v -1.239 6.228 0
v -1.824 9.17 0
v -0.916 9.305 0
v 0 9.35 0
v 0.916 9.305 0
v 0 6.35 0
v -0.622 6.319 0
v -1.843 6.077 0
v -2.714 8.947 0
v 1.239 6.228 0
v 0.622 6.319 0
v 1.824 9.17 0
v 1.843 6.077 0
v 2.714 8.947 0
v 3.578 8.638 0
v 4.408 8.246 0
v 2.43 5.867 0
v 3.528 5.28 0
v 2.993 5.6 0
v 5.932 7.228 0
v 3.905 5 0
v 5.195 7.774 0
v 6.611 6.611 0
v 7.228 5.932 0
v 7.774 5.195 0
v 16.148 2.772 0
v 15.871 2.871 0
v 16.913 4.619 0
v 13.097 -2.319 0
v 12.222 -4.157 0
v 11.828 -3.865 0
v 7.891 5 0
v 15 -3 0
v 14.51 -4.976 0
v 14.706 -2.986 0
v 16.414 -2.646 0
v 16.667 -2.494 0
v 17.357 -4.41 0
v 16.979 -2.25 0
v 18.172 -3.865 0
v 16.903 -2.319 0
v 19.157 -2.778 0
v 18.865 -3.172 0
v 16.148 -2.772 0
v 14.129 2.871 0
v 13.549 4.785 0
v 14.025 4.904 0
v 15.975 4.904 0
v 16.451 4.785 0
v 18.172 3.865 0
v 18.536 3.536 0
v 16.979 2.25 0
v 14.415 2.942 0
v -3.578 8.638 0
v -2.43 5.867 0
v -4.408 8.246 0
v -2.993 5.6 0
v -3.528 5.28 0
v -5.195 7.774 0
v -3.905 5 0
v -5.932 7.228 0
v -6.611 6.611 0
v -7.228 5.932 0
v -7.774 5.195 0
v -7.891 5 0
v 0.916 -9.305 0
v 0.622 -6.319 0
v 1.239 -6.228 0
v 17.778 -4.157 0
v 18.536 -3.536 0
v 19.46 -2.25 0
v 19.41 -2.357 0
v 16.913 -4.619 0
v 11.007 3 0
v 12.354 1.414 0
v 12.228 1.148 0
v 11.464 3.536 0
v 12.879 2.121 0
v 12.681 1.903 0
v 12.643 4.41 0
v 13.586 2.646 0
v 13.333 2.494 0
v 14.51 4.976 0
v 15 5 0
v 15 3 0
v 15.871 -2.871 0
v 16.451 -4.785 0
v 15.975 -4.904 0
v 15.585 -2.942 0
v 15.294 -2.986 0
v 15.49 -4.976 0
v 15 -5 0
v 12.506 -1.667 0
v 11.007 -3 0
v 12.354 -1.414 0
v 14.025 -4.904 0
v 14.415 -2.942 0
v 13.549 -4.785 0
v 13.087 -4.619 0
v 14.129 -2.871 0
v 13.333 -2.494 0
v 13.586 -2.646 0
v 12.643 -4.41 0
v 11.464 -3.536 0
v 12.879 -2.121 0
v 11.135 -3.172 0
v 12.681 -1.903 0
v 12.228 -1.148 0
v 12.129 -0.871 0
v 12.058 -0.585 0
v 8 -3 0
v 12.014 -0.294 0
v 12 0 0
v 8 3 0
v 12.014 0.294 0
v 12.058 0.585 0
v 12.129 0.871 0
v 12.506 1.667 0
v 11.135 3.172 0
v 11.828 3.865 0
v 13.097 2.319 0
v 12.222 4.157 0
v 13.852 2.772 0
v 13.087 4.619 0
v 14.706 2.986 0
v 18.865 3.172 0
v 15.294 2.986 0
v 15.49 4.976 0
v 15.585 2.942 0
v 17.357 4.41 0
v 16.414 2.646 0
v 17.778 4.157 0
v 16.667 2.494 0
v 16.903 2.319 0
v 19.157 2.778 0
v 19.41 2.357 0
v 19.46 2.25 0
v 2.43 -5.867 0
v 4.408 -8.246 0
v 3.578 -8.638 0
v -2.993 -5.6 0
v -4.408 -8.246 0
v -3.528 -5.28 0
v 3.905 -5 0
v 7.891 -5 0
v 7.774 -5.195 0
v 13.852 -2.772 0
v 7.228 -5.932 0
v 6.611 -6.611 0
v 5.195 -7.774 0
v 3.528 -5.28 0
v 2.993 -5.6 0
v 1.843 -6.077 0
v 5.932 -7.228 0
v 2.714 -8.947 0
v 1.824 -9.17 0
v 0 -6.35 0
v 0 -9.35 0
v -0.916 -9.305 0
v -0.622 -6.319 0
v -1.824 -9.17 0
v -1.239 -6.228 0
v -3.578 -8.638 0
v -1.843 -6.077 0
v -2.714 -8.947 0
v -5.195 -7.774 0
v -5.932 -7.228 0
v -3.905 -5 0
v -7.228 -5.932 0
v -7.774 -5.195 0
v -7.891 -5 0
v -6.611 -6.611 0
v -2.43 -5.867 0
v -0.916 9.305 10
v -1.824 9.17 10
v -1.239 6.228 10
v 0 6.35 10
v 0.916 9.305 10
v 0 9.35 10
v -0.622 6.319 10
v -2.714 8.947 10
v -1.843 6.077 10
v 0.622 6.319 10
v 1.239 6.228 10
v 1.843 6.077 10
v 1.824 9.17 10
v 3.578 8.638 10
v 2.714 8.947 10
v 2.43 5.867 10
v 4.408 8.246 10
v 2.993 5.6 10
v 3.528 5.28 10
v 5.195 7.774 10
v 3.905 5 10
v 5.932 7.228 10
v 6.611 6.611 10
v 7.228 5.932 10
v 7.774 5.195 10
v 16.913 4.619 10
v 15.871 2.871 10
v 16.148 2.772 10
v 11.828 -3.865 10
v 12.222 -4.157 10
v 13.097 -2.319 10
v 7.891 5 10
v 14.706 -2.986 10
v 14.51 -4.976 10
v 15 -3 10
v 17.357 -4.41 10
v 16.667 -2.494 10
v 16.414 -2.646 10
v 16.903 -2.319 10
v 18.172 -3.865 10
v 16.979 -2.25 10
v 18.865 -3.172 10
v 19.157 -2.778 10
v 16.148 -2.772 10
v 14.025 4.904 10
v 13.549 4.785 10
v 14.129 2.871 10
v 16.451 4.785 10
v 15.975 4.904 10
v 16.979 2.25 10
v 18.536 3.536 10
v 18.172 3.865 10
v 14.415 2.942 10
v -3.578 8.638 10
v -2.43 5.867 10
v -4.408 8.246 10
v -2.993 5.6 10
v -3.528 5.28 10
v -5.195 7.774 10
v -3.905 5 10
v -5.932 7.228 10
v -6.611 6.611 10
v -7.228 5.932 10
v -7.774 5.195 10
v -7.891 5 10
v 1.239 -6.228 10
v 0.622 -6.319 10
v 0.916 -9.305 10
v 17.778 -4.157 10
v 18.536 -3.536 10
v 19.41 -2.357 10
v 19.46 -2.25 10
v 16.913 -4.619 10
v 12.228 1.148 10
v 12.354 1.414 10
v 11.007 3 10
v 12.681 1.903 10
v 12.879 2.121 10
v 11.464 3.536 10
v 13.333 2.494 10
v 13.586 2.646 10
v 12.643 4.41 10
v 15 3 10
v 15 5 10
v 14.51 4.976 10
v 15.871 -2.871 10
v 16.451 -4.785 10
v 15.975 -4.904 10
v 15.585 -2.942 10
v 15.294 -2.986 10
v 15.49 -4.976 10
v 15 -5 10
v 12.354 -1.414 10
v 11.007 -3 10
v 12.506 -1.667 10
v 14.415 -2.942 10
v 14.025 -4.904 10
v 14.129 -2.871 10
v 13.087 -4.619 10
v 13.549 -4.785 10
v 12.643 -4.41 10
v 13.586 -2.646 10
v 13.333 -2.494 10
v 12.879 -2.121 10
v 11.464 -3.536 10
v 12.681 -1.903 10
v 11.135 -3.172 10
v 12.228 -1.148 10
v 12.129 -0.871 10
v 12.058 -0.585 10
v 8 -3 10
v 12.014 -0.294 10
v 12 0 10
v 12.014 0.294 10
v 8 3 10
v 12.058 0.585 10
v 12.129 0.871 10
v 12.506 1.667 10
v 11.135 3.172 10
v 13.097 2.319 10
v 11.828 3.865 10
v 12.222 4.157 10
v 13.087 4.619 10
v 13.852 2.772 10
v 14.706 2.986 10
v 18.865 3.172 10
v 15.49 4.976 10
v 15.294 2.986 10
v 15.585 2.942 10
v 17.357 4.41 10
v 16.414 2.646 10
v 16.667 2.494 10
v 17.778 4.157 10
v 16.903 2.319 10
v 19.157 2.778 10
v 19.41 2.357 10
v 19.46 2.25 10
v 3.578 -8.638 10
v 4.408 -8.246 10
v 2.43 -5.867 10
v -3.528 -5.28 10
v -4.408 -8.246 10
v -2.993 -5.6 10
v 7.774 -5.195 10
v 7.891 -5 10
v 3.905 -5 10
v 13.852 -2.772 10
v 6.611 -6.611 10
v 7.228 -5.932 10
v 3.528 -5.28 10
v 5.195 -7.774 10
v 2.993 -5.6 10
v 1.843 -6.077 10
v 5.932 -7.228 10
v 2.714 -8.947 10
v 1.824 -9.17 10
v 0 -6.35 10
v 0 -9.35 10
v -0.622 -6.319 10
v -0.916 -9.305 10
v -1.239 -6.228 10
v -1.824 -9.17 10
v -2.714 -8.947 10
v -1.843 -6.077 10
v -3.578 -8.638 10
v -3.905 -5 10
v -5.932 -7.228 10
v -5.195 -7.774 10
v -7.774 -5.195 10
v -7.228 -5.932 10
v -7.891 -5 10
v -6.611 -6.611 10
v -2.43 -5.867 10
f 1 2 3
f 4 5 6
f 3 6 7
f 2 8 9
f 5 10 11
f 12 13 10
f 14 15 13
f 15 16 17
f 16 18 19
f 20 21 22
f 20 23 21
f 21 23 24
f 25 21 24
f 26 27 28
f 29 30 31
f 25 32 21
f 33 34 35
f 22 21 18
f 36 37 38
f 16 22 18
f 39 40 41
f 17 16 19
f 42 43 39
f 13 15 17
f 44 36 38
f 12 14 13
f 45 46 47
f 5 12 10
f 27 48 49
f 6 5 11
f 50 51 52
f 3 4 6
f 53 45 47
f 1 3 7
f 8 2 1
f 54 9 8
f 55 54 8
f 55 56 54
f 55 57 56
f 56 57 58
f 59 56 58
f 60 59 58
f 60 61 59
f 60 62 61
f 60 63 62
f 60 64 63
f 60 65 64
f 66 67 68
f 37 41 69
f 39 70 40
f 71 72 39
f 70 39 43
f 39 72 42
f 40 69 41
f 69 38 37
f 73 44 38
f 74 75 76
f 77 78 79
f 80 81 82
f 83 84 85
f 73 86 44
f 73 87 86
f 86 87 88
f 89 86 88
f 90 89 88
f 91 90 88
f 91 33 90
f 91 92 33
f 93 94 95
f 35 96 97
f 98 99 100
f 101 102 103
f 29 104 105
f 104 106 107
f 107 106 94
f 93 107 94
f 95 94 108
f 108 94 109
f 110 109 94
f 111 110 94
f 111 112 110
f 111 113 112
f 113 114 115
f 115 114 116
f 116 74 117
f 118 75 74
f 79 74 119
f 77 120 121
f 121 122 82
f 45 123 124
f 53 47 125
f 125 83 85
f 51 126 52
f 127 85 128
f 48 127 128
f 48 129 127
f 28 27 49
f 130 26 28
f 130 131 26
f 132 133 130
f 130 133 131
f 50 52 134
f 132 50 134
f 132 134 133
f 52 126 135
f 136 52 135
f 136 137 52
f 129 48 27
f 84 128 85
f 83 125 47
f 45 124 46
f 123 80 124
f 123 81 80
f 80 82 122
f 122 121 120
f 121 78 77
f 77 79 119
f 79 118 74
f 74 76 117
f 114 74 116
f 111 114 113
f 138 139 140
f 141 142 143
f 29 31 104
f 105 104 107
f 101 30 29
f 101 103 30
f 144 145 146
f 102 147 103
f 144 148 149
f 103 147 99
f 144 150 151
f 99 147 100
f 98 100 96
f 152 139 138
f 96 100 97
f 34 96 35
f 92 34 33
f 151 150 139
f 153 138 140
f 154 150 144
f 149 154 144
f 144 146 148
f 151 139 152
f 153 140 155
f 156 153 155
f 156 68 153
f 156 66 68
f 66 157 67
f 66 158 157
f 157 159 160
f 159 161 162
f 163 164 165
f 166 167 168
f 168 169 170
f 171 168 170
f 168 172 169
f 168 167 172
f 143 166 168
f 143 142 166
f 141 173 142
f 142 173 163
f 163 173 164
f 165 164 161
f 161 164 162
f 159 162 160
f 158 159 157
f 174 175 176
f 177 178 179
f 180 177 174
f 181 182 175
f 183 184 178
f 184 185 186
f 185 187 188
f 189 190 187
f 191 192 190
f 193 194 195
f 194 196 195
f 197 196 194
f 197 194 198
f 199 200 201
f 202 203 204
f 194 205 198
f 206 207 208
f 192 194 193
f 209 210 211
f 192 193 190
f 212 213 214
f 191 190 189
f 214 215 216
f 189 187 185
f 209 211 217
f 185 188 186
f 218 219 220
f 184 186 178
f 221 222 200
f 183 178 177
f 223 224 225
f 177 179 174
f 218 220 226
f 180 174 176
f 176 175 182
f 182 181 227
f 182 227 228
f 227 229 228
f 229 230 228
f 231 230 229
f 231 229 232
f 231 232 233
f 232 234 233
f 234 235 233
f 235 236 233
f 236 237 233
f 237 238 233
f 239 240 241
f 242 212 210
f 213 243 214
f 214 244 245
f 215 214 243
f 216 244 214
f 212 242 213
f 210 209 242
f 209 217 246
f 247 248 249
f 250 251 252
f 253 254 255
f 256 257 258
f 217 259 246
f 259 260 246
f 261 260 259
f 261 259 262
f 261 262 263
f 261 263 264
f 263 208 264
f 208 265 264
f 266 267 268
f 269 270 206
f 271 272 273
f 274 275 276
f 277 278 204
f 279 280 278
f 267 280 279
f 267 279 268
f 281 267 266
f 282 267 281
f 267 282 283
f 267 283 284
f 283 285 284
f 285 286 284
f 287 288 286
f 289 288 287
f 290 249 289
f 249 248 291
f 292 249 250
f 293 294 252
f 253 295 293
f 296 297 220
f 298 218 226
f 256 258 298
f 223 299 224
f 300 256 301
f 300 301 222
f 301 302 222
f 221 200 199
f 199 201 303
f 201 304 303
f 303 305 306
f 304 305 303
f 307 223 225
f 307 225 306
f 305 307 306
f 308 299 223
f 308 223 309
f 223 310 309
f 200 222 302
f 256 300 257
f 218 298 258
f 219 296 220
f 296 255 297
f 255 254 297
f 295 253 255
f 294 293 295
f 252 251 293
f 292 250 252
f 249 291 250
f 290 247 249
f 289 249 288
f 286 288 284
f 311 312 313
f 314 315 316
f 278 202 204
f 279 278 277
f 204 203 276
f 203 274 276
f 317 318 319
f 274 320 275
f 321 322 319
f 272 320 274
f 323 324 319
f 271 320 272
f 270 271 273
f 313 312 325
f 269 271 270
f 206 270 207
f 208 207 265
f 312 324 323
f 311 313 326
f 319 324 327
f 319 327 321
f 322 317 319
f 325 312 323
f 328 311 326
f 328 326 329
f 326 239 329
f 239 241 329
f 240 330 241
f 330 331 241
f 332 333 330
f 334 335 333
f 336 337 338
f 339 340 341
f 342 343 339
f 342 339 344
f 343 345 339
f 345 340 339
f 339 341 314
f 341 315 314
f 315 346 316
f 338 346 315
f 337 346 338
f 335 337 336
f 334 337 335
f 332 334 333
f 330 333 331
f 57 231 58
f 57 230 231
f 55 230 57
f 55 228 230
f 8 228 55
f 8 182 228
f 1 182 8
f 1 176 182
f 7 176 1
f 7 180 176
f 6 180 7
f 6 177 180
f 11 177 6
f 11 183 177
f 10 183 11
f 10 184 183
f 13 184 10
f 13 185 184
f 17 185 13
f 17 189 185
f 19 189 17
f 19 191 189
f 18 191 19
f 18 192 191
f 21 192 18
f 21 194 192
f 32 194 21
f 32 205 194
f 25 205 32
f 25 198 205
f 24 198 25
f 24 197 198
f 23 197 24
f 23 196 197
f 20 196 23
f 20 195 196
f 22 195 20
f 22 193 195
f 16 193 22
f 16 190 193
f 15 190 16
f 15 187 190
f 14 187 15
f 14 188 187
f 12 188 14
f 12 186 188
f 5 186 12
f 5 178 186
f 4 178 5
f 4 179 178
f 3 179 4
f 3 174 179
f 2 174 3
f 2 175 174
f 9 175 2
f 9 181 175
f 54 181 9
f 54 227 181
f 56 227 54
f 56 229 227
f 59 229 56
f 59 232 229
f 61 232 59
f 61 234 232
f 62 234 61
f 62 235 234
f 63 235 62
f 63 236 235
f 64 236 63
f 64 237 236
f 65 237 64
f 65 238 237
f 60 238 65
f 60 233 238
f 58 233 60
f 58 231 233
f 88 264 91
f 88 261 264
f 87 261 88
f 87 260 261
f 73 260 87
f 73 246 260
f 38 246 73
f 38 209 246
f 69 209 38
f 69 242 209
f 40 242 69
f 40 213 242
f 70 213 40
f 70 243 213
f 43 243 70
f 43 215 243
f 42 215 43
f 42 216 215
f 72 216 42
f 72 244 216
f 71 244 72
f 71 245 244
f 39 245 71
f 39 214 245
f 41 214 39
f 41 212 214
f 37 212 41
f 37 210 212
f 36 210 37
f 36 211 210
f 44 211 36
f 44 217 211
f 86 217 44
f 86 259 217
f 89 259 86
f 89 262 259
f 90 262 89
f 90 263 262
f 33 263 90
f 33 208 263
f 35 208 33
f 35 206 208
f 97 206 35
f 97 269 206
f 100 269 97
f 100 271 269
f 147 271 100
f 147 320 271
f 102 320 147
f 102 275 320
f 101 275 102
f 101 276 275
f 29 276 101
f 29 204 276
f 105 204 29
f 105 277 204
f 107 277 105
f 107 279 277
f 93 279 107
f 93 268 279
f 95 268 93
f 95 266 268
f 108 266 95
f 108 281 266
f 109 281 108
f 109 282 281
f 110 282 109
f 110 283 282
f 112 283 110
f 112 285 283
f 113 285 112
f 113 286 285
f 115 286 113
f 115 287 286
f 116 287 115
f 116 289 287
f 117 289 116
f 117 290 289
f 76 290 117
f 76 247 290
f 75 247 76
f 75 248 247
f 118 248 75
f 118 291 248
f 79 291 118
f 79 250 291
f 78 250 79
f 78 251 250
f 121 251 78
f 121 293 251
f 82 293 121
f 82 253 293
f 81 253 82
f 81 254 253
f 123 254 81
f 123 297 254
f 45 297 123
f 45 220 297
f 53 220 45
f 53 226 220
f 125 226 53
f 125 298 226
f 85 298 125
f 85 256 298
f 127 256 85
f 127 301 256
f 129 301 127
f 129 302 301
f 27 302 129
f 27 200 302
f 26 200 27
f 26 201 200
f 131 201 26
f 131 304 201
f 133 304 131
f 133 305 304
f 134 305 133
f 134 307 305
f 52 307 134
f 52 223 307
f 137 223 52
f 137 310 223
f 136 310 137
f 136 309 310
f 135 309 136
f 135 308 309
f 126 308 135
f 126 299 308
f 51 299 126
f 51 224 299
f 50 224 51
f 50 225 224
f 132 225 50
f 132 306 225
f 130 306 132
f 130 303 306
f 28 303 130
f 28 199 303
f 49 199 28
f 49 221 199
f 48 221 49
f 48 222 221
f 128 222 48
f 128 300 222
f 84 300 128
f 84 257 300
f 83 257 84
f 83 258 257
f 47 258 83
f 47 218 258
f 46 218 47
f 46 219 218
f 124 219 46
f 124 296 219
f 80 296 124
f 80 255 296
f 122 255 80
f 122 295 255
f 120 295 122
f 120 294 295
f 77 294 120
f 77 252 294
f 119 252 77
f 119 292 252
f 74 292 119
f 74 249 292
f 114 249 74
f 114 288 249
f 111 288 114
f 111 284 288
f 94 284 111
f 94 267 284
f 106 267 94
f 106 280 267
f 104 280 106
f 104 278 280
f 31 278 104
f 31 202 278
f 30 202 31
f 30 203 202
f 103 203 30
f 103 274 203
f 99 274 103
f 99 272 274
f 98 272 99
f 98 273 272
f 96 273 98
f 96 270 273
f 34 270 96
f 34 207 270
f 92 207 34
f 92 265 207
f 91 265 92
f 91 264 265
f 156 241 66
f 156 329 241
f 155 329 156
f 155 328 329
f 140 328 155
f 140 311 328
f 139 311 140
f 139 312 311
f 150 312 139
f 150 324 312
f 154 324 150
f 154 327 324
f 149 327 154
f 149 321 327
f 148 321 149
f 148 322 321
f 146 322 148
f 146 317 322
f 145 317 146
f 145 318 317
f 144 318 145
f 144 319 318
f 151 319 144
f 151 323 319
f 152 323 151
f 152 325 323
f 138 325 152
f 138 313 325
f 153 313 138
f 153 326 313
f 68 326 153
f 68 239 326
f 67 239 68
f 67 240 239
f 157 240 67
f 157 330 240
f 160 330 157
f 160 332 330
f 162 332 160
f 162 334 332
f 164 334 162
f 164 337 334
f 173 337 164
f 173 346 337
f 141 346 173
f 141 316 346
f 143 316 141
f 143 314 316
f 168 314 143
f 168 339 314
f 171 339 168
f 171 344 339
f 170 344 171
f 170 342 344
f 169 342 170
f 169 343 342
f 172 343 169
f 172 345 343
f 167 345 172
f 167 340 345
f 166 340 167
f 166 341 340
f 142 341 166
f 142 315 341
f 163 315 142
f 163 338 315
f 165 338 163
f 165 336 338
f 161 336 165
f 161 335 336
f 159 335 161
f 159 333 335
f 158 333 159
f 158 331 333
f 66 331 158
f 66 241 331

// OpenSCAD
// Snap-on clip for 12.7 mm lab stand rod and 6 mm ID tubing
// Printed flat (10 mm tall extrusion in Z)

// Dimensions
rod_id = 12.7;          // Inner diameter of rod ring
rod_wall = 3;           // Wall thickness of rod ring
rod_od = rod_id + 2 * rod_wall; // Outer diameter of rod ring (18.7 mm)

tube_id = 6;            // Inner diameter of tubing ring
tube_wall = 2;          // Wall thickness of tubing ring
tube_od = tube_id + 2 * tube_wall; // Outer diameter of tubing ring (10 mm)

tube_center_x = 15;     // X position of tubing ring center

bridge_x_start = 8;     // Start of bridge (X)
bridge_x_end = 12;      // End of bridge (X)
bridge_width = 6;       // Width of bridge (Y)

rod_slot_width = 10;    // Width of opening in rod ring (Y)
rod_slot_half = rod_slot_width / 2;

tube_slot_width = 4.5;  // Width of opening in tubing ring (Y)
tube_slot_half = tube_slot_width / 2;

extrusion_height = 10;  // Height of the part in Z

$fn = 64;

linear_extrude(height = extrusion_height, center = false, convexity = 10) {
    union() {
        // Rod ring (centered at origin)
        difference() {
            circle(r = rod_od / 2);
            circle(r = rod_id / 2);
            // Cut out the -X side opening: x < 0 and -rod_slot_half < y < rod_slot_half
            // We use a large rectangle extending to -infinity in X, bounded in Y
            translate([-rod_od, -rod_slot_half])
                square([rod_od * 2, rod_slot_width]);
        }

        // Tubing ring (centered at x = 15, y = 0)
        difference() {
            translate([tube_center_x, 0])
                circle(r = tube_od / 2);
            translate([tube_center_x, 0])
                circle(r = tube_id / 2);
            // Cut out the +X side opening: x > 15 and -tube_slot_half < y < tube_slot_half
            // Rectangle starting at x = 15, extending to +infinity
            translate([tube_center_x, -tube_slot_half])
                square([tube_od * 2, tube_slot_width]);
        }

        // Solid bridge between x = 8 and x = 12, width 6 mm in Y
        translate([bridge_x_start, -bridge_width / 2])
            square([bridge_x_end - bridge_x_start, bridge_width]);
    }
}
